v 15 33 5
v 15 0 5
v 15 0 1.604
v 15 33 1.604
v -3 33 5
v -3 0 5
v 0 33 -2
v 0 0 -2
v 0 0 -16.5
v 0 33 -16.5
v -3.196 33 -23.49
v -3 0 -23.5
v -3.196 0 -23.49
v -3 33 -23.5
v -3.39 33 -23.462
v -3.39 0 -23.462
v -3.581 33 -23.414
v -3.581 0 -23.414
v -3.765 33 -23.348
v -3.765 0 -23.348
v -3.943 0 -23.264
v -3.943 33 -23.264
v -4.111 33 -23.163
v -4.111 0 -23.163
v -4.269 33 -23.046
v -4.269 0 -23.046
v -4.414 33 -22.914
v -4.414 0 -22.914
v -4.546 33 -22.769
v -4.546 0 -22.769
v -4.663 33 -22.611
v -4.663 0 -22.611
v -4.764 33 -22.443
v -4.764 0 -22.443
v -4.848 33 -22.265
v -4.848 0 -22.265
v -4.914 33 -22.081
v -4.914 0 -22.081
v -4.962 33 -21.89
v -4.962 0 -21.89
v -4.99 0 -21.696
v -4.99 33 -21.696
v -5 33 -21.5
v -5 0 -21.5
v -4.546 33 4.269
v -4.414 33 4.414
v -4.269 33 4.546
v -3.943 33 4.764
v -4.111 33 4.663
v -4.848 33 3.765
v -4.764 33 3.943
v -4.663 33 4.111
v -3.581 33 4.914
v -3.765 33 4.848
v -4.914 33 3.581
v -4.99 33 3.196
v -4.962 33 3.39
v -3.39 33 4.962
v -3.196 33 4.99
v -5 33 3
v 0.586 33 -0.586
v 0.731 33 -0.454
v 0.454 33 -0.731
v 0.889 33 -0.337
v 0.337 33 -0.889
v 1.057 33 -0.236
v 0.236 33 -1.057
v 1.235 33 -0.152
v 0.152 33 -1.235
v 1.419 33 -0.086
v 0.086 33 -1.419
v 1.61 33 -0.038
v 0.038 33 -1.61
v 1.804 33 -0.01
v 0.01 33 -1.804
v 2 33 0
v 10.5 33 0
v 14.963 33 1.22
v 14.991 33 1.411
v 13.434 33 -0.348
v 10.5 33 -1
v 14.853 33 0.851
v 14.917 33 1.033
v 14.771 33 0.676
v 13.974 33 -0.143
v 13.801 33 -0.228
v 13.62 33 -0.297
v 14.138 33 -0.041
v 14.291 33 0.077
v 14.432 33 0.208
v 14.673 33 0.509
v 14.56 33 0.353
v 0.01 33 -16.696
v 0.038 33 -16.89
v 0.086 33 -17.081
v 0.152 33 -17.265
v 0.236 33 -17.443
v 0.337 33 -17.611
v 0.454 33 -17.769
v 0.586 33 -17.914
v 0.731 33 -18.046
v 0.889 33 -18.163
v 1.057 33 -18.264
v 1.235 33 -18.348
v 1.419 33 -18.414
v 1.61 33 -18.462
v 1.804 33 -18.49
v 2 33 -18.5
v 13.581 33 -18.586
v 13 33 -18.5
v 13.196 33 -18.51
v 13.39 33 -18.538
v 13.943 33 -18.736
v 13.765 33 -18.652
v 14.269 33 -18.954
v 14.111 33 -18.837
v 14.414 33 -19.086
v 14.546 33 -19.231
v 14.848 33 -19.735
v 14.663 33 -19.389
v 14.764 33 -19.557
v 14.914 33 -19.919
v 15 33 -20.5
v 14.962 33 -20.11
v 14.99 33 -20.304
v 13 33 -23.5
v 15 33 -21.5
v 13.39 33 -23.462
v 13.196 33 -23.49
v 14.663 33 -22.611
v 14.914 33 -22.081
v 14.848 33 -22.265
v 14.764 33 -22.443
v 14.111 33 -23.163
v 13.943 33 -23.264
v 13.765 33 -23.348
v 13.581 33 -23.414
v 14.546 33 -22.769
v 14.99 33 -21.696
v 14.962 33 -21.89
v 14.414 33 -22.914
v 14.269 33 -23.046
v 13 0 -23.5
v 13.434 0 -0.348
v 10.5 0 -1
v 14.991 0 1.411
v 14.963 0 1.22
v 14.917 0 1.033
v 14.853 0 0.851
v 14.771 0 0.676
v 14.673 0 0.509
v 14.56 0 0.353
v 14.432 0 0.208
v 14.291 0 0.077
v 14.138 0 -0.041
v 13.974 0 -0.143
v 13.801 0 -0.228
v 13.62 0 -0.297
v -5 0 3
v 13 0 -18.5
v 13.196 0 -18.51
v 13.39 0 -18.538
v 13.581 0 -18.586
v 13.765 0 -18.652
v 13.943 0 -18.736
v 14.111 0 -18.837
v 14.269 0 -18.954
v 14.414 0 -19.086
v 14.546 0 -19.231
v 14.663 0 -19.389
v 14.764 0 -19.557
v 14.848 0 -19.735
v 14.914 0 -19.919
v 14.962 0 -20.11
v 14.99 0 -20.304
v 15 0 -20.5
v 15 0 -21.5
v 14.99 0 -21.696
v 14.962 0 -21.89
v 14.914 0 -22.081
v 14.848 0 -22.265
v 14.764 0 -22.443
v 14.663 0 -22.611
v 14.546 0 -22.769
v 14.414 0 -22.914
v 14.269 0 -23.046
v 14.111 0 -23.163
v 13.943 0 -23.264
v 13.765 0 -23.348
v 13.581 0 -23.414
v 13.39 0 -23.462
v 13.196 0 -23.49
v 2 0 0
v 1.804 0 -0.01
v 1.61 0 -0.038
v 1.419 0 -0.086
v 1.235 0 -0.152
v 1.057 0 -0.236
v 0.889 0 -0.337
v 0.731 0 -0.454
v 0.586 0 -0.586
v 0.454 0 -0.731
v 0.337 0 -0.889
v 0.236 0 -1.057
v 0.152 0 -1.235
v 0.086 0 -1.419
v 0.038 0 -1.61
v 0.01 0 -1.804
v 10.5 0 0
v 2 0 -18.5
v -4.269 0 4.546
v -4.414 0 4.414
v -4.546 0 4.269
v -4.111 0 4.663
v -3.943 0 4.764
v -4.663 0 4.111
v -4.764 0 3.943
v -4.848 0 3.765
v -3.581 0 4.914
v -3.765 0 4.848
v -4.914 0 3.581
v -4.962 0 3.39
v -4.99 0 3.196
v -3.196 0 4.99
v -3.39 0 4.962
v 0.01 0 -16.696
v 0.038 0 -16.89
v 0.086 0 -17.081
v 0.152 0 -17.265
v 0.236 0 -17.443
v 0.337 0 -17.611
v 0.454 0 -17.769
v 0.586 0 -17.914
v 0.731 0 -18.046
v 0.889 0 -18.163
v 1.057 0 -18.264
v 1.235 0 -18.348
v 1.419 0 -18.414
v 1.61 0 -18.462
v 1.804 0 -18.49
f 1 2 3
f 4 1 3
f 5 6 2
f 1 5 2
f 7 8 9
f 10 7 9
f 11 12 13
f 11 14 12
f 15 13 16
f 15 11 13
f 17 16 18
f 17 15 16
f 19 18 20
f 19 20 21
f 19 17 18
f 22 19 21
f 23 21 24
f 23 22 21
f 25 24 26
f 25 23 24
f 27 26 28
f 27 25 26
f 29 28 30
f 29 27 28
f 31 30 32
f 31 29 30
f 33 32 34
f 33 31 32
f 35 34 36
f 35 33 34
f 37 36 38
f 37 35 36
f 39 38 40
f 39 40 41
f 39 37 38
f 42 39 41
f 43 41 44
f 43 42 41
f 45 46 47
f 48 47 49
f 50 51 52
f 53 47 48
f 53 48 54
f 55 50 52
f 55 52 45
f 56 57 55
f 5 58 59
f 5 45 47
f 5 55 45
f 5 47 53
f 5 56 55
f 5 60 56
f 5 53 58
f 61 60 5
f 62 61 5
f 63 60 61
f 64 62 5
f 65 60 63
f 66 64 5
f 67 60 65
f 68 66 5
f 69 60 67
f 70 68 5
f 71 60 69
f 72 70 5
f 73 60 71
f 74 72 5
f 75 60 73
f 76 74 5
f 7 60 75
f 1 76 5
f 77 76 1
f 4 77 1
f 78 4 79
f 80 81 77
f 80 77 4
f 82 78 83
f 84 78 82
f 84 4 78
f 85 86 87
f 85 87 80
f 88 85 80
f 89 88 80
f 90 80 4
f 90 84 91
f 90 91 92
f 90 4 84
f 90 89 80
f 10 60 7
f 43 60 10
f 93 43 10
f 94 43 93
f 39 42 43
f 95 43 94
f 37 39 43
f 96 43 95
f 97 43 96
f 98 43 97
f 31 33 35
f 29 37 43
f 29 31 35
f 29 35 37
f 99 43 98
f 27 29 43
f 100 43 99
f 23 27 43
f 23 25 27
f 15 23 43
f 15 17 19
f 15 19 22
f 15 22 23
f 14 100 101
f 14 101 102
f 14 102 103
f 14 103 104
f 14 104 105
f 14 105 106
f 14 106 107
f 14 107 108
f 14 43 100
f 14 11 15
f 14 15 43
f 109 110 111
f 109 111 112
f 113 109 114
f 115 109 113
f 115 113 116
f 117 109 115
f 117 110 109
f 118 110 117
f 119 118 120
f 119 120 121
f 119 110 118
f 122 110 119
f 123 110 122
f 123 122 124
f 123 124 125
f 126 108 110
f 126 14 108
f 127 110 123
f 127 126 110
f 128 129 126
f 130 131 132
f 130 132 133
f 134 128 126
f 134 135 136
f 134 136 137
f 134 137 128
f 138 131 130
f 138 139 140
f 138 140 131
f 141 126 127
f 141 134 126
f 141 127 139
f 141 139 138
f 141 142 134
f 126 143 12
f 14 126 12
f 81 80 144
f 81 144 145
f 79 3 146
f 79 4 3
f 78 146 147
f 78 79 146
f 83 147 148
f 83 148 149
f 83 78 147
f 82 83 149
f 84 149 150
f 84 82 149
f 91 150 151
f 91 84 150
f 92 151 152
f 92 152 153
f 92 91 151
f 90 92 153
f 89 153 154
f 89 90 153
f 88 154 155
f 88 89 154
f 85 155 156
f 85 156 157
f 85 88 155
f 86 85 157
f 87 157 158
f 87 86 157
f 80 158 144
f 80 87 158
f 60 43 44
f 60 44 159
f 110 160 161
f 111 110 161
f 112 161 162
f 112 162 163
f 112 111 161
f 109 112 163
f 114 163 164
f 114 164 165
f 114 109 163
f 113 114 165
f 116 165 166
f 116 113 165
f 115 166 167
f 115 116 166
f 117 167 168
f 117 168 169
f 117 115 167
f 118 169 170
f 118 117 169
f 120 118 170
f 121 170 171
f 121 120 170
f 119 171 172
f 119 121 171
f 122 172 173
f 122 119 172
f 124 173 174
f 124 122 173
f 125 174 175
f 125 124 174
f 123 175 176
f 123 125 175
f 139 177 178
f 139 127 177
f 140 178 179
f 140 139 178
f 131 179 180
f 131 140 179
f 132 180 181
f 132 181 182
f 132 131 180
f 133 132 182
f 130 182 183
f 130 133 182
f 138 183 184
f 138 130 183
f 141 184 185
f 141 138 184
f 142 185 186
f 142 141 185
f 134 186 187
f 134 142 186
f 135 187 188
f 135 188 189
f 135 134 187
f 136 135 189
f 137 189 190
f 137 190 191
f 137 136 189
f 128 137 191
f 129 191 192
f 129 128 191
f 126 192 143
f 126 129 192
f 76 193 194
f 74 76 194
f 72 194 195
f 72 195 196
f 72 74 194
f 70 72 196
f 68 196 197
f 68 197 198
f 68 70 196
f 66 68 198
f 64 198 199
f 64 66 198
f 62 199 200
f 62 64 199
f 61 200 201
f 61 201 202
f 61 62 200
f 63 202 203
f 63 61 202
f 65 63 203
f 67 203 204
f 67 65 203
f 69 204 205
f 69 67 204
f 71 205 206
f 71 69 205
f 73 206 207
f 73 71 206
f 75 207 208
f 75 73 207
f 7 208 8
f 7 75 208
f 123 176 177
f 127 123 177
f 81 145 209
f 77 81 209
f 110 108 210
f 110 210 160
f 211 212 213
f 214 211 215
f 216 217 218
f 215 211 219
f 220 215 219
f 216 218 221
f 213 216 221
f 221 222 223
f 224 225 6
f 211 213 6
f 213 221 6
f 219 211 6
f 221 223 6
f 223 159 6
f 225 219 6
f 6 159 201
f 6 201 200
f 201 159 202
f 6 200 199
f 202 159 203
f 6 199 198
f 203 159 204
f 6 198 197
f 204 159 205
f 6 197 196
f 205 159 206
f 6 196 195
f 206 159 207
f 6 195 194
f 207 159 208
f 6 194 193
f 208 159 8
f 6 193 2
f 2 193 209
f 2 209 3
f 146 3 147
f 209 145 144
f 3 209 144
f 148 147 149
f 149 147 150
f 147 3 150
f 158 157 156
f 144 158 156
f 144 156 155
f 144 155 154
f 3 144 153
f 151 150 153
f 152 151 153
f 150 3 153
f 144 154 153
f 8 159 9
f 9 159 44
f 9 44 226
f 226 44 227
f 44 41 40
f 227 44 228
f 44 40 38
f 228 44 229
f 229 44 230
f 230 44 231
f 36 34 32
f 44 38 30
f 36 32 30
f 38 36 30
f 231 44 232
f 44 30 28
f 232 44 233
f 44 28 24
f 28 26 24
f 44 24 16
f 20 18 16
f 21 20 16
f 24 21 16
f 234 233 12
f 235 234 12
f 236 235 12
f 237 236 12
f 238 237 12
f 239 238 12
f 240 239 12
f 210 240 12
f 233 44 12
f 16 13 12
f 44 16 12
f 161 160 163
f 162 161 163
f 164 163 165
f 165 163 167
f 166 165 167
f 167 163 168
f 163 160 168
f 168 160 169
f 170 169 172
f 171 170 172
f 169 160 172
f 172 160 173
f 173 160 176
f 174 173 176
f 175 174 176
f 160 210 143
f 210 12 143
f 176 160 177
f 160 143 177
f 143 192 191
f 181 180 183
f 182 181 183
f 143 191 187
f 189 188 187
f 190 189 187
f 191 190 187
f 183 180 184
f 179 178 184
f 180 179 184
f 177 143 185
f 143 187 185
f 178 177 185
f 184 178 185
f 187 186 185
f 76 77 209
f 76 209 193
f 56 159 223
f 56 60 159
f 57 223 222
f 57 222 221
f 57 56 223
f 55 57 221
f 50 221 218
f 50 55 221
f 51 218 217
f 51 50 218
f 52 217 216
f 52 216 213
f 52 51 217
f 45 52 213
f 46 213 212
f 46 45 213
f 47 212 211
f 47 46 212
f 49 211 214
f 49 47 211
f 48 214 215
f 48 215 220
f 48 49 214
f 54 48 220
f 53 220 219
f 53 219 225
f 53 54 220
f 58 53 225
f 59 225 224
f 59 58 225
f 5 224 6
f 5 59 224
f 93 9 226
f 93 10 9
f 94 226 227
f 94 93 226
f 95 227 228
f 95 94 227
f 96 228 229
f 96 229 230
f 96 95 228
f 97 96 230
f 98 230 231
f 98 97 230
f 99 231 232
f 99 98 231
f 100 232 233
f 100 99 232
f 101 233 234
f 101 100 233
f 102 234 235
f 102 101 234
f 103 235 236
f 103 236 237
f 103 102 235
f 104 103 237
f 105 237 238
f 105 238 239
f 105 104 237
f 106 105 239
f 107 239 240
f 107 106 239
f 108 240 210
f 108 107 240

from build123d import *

# Parameters (mm, degrees)
BOSS_EXTRUDE1_DEPTH = 33
FILLET1_R           = 2


with BuildPart() as part:
    # Sketch1 → Boss-Extrude1 (new body)
    with BuildSketch(Plane(origin=(0, 0, 0), x_dir=(1, 0, 0), z_dir=(0, 1, 0))):
        Polygon((10.5, 1), (10.5, 0), (15, 0), align=None)
        Polygon((15, -5), (15, 0), (0, 0), (0, 18.5), (15, 18.5), (15, 23.5), (-5, 23.5), (-5, -5), align=None)
    extrude(amount=BOSS_EXTRUDE1_DEPTH)

    # Fillet1
    fillet1_edges = [part.edges().sort_by_distance(p)[0] for p in [
        (15, 16.5, 0),
        (-5, 16.5, 5),
        (-5, 16.5, -23.5),
        (15, 16.5, -23.5),
        (15, 16.5, -18.5),
        (0, 16.5, -18.5),
        (0, 16.5, 0),
    ]]
    fillet(fillet1_edges, radius=FILLET1_R)


solid = part.part
